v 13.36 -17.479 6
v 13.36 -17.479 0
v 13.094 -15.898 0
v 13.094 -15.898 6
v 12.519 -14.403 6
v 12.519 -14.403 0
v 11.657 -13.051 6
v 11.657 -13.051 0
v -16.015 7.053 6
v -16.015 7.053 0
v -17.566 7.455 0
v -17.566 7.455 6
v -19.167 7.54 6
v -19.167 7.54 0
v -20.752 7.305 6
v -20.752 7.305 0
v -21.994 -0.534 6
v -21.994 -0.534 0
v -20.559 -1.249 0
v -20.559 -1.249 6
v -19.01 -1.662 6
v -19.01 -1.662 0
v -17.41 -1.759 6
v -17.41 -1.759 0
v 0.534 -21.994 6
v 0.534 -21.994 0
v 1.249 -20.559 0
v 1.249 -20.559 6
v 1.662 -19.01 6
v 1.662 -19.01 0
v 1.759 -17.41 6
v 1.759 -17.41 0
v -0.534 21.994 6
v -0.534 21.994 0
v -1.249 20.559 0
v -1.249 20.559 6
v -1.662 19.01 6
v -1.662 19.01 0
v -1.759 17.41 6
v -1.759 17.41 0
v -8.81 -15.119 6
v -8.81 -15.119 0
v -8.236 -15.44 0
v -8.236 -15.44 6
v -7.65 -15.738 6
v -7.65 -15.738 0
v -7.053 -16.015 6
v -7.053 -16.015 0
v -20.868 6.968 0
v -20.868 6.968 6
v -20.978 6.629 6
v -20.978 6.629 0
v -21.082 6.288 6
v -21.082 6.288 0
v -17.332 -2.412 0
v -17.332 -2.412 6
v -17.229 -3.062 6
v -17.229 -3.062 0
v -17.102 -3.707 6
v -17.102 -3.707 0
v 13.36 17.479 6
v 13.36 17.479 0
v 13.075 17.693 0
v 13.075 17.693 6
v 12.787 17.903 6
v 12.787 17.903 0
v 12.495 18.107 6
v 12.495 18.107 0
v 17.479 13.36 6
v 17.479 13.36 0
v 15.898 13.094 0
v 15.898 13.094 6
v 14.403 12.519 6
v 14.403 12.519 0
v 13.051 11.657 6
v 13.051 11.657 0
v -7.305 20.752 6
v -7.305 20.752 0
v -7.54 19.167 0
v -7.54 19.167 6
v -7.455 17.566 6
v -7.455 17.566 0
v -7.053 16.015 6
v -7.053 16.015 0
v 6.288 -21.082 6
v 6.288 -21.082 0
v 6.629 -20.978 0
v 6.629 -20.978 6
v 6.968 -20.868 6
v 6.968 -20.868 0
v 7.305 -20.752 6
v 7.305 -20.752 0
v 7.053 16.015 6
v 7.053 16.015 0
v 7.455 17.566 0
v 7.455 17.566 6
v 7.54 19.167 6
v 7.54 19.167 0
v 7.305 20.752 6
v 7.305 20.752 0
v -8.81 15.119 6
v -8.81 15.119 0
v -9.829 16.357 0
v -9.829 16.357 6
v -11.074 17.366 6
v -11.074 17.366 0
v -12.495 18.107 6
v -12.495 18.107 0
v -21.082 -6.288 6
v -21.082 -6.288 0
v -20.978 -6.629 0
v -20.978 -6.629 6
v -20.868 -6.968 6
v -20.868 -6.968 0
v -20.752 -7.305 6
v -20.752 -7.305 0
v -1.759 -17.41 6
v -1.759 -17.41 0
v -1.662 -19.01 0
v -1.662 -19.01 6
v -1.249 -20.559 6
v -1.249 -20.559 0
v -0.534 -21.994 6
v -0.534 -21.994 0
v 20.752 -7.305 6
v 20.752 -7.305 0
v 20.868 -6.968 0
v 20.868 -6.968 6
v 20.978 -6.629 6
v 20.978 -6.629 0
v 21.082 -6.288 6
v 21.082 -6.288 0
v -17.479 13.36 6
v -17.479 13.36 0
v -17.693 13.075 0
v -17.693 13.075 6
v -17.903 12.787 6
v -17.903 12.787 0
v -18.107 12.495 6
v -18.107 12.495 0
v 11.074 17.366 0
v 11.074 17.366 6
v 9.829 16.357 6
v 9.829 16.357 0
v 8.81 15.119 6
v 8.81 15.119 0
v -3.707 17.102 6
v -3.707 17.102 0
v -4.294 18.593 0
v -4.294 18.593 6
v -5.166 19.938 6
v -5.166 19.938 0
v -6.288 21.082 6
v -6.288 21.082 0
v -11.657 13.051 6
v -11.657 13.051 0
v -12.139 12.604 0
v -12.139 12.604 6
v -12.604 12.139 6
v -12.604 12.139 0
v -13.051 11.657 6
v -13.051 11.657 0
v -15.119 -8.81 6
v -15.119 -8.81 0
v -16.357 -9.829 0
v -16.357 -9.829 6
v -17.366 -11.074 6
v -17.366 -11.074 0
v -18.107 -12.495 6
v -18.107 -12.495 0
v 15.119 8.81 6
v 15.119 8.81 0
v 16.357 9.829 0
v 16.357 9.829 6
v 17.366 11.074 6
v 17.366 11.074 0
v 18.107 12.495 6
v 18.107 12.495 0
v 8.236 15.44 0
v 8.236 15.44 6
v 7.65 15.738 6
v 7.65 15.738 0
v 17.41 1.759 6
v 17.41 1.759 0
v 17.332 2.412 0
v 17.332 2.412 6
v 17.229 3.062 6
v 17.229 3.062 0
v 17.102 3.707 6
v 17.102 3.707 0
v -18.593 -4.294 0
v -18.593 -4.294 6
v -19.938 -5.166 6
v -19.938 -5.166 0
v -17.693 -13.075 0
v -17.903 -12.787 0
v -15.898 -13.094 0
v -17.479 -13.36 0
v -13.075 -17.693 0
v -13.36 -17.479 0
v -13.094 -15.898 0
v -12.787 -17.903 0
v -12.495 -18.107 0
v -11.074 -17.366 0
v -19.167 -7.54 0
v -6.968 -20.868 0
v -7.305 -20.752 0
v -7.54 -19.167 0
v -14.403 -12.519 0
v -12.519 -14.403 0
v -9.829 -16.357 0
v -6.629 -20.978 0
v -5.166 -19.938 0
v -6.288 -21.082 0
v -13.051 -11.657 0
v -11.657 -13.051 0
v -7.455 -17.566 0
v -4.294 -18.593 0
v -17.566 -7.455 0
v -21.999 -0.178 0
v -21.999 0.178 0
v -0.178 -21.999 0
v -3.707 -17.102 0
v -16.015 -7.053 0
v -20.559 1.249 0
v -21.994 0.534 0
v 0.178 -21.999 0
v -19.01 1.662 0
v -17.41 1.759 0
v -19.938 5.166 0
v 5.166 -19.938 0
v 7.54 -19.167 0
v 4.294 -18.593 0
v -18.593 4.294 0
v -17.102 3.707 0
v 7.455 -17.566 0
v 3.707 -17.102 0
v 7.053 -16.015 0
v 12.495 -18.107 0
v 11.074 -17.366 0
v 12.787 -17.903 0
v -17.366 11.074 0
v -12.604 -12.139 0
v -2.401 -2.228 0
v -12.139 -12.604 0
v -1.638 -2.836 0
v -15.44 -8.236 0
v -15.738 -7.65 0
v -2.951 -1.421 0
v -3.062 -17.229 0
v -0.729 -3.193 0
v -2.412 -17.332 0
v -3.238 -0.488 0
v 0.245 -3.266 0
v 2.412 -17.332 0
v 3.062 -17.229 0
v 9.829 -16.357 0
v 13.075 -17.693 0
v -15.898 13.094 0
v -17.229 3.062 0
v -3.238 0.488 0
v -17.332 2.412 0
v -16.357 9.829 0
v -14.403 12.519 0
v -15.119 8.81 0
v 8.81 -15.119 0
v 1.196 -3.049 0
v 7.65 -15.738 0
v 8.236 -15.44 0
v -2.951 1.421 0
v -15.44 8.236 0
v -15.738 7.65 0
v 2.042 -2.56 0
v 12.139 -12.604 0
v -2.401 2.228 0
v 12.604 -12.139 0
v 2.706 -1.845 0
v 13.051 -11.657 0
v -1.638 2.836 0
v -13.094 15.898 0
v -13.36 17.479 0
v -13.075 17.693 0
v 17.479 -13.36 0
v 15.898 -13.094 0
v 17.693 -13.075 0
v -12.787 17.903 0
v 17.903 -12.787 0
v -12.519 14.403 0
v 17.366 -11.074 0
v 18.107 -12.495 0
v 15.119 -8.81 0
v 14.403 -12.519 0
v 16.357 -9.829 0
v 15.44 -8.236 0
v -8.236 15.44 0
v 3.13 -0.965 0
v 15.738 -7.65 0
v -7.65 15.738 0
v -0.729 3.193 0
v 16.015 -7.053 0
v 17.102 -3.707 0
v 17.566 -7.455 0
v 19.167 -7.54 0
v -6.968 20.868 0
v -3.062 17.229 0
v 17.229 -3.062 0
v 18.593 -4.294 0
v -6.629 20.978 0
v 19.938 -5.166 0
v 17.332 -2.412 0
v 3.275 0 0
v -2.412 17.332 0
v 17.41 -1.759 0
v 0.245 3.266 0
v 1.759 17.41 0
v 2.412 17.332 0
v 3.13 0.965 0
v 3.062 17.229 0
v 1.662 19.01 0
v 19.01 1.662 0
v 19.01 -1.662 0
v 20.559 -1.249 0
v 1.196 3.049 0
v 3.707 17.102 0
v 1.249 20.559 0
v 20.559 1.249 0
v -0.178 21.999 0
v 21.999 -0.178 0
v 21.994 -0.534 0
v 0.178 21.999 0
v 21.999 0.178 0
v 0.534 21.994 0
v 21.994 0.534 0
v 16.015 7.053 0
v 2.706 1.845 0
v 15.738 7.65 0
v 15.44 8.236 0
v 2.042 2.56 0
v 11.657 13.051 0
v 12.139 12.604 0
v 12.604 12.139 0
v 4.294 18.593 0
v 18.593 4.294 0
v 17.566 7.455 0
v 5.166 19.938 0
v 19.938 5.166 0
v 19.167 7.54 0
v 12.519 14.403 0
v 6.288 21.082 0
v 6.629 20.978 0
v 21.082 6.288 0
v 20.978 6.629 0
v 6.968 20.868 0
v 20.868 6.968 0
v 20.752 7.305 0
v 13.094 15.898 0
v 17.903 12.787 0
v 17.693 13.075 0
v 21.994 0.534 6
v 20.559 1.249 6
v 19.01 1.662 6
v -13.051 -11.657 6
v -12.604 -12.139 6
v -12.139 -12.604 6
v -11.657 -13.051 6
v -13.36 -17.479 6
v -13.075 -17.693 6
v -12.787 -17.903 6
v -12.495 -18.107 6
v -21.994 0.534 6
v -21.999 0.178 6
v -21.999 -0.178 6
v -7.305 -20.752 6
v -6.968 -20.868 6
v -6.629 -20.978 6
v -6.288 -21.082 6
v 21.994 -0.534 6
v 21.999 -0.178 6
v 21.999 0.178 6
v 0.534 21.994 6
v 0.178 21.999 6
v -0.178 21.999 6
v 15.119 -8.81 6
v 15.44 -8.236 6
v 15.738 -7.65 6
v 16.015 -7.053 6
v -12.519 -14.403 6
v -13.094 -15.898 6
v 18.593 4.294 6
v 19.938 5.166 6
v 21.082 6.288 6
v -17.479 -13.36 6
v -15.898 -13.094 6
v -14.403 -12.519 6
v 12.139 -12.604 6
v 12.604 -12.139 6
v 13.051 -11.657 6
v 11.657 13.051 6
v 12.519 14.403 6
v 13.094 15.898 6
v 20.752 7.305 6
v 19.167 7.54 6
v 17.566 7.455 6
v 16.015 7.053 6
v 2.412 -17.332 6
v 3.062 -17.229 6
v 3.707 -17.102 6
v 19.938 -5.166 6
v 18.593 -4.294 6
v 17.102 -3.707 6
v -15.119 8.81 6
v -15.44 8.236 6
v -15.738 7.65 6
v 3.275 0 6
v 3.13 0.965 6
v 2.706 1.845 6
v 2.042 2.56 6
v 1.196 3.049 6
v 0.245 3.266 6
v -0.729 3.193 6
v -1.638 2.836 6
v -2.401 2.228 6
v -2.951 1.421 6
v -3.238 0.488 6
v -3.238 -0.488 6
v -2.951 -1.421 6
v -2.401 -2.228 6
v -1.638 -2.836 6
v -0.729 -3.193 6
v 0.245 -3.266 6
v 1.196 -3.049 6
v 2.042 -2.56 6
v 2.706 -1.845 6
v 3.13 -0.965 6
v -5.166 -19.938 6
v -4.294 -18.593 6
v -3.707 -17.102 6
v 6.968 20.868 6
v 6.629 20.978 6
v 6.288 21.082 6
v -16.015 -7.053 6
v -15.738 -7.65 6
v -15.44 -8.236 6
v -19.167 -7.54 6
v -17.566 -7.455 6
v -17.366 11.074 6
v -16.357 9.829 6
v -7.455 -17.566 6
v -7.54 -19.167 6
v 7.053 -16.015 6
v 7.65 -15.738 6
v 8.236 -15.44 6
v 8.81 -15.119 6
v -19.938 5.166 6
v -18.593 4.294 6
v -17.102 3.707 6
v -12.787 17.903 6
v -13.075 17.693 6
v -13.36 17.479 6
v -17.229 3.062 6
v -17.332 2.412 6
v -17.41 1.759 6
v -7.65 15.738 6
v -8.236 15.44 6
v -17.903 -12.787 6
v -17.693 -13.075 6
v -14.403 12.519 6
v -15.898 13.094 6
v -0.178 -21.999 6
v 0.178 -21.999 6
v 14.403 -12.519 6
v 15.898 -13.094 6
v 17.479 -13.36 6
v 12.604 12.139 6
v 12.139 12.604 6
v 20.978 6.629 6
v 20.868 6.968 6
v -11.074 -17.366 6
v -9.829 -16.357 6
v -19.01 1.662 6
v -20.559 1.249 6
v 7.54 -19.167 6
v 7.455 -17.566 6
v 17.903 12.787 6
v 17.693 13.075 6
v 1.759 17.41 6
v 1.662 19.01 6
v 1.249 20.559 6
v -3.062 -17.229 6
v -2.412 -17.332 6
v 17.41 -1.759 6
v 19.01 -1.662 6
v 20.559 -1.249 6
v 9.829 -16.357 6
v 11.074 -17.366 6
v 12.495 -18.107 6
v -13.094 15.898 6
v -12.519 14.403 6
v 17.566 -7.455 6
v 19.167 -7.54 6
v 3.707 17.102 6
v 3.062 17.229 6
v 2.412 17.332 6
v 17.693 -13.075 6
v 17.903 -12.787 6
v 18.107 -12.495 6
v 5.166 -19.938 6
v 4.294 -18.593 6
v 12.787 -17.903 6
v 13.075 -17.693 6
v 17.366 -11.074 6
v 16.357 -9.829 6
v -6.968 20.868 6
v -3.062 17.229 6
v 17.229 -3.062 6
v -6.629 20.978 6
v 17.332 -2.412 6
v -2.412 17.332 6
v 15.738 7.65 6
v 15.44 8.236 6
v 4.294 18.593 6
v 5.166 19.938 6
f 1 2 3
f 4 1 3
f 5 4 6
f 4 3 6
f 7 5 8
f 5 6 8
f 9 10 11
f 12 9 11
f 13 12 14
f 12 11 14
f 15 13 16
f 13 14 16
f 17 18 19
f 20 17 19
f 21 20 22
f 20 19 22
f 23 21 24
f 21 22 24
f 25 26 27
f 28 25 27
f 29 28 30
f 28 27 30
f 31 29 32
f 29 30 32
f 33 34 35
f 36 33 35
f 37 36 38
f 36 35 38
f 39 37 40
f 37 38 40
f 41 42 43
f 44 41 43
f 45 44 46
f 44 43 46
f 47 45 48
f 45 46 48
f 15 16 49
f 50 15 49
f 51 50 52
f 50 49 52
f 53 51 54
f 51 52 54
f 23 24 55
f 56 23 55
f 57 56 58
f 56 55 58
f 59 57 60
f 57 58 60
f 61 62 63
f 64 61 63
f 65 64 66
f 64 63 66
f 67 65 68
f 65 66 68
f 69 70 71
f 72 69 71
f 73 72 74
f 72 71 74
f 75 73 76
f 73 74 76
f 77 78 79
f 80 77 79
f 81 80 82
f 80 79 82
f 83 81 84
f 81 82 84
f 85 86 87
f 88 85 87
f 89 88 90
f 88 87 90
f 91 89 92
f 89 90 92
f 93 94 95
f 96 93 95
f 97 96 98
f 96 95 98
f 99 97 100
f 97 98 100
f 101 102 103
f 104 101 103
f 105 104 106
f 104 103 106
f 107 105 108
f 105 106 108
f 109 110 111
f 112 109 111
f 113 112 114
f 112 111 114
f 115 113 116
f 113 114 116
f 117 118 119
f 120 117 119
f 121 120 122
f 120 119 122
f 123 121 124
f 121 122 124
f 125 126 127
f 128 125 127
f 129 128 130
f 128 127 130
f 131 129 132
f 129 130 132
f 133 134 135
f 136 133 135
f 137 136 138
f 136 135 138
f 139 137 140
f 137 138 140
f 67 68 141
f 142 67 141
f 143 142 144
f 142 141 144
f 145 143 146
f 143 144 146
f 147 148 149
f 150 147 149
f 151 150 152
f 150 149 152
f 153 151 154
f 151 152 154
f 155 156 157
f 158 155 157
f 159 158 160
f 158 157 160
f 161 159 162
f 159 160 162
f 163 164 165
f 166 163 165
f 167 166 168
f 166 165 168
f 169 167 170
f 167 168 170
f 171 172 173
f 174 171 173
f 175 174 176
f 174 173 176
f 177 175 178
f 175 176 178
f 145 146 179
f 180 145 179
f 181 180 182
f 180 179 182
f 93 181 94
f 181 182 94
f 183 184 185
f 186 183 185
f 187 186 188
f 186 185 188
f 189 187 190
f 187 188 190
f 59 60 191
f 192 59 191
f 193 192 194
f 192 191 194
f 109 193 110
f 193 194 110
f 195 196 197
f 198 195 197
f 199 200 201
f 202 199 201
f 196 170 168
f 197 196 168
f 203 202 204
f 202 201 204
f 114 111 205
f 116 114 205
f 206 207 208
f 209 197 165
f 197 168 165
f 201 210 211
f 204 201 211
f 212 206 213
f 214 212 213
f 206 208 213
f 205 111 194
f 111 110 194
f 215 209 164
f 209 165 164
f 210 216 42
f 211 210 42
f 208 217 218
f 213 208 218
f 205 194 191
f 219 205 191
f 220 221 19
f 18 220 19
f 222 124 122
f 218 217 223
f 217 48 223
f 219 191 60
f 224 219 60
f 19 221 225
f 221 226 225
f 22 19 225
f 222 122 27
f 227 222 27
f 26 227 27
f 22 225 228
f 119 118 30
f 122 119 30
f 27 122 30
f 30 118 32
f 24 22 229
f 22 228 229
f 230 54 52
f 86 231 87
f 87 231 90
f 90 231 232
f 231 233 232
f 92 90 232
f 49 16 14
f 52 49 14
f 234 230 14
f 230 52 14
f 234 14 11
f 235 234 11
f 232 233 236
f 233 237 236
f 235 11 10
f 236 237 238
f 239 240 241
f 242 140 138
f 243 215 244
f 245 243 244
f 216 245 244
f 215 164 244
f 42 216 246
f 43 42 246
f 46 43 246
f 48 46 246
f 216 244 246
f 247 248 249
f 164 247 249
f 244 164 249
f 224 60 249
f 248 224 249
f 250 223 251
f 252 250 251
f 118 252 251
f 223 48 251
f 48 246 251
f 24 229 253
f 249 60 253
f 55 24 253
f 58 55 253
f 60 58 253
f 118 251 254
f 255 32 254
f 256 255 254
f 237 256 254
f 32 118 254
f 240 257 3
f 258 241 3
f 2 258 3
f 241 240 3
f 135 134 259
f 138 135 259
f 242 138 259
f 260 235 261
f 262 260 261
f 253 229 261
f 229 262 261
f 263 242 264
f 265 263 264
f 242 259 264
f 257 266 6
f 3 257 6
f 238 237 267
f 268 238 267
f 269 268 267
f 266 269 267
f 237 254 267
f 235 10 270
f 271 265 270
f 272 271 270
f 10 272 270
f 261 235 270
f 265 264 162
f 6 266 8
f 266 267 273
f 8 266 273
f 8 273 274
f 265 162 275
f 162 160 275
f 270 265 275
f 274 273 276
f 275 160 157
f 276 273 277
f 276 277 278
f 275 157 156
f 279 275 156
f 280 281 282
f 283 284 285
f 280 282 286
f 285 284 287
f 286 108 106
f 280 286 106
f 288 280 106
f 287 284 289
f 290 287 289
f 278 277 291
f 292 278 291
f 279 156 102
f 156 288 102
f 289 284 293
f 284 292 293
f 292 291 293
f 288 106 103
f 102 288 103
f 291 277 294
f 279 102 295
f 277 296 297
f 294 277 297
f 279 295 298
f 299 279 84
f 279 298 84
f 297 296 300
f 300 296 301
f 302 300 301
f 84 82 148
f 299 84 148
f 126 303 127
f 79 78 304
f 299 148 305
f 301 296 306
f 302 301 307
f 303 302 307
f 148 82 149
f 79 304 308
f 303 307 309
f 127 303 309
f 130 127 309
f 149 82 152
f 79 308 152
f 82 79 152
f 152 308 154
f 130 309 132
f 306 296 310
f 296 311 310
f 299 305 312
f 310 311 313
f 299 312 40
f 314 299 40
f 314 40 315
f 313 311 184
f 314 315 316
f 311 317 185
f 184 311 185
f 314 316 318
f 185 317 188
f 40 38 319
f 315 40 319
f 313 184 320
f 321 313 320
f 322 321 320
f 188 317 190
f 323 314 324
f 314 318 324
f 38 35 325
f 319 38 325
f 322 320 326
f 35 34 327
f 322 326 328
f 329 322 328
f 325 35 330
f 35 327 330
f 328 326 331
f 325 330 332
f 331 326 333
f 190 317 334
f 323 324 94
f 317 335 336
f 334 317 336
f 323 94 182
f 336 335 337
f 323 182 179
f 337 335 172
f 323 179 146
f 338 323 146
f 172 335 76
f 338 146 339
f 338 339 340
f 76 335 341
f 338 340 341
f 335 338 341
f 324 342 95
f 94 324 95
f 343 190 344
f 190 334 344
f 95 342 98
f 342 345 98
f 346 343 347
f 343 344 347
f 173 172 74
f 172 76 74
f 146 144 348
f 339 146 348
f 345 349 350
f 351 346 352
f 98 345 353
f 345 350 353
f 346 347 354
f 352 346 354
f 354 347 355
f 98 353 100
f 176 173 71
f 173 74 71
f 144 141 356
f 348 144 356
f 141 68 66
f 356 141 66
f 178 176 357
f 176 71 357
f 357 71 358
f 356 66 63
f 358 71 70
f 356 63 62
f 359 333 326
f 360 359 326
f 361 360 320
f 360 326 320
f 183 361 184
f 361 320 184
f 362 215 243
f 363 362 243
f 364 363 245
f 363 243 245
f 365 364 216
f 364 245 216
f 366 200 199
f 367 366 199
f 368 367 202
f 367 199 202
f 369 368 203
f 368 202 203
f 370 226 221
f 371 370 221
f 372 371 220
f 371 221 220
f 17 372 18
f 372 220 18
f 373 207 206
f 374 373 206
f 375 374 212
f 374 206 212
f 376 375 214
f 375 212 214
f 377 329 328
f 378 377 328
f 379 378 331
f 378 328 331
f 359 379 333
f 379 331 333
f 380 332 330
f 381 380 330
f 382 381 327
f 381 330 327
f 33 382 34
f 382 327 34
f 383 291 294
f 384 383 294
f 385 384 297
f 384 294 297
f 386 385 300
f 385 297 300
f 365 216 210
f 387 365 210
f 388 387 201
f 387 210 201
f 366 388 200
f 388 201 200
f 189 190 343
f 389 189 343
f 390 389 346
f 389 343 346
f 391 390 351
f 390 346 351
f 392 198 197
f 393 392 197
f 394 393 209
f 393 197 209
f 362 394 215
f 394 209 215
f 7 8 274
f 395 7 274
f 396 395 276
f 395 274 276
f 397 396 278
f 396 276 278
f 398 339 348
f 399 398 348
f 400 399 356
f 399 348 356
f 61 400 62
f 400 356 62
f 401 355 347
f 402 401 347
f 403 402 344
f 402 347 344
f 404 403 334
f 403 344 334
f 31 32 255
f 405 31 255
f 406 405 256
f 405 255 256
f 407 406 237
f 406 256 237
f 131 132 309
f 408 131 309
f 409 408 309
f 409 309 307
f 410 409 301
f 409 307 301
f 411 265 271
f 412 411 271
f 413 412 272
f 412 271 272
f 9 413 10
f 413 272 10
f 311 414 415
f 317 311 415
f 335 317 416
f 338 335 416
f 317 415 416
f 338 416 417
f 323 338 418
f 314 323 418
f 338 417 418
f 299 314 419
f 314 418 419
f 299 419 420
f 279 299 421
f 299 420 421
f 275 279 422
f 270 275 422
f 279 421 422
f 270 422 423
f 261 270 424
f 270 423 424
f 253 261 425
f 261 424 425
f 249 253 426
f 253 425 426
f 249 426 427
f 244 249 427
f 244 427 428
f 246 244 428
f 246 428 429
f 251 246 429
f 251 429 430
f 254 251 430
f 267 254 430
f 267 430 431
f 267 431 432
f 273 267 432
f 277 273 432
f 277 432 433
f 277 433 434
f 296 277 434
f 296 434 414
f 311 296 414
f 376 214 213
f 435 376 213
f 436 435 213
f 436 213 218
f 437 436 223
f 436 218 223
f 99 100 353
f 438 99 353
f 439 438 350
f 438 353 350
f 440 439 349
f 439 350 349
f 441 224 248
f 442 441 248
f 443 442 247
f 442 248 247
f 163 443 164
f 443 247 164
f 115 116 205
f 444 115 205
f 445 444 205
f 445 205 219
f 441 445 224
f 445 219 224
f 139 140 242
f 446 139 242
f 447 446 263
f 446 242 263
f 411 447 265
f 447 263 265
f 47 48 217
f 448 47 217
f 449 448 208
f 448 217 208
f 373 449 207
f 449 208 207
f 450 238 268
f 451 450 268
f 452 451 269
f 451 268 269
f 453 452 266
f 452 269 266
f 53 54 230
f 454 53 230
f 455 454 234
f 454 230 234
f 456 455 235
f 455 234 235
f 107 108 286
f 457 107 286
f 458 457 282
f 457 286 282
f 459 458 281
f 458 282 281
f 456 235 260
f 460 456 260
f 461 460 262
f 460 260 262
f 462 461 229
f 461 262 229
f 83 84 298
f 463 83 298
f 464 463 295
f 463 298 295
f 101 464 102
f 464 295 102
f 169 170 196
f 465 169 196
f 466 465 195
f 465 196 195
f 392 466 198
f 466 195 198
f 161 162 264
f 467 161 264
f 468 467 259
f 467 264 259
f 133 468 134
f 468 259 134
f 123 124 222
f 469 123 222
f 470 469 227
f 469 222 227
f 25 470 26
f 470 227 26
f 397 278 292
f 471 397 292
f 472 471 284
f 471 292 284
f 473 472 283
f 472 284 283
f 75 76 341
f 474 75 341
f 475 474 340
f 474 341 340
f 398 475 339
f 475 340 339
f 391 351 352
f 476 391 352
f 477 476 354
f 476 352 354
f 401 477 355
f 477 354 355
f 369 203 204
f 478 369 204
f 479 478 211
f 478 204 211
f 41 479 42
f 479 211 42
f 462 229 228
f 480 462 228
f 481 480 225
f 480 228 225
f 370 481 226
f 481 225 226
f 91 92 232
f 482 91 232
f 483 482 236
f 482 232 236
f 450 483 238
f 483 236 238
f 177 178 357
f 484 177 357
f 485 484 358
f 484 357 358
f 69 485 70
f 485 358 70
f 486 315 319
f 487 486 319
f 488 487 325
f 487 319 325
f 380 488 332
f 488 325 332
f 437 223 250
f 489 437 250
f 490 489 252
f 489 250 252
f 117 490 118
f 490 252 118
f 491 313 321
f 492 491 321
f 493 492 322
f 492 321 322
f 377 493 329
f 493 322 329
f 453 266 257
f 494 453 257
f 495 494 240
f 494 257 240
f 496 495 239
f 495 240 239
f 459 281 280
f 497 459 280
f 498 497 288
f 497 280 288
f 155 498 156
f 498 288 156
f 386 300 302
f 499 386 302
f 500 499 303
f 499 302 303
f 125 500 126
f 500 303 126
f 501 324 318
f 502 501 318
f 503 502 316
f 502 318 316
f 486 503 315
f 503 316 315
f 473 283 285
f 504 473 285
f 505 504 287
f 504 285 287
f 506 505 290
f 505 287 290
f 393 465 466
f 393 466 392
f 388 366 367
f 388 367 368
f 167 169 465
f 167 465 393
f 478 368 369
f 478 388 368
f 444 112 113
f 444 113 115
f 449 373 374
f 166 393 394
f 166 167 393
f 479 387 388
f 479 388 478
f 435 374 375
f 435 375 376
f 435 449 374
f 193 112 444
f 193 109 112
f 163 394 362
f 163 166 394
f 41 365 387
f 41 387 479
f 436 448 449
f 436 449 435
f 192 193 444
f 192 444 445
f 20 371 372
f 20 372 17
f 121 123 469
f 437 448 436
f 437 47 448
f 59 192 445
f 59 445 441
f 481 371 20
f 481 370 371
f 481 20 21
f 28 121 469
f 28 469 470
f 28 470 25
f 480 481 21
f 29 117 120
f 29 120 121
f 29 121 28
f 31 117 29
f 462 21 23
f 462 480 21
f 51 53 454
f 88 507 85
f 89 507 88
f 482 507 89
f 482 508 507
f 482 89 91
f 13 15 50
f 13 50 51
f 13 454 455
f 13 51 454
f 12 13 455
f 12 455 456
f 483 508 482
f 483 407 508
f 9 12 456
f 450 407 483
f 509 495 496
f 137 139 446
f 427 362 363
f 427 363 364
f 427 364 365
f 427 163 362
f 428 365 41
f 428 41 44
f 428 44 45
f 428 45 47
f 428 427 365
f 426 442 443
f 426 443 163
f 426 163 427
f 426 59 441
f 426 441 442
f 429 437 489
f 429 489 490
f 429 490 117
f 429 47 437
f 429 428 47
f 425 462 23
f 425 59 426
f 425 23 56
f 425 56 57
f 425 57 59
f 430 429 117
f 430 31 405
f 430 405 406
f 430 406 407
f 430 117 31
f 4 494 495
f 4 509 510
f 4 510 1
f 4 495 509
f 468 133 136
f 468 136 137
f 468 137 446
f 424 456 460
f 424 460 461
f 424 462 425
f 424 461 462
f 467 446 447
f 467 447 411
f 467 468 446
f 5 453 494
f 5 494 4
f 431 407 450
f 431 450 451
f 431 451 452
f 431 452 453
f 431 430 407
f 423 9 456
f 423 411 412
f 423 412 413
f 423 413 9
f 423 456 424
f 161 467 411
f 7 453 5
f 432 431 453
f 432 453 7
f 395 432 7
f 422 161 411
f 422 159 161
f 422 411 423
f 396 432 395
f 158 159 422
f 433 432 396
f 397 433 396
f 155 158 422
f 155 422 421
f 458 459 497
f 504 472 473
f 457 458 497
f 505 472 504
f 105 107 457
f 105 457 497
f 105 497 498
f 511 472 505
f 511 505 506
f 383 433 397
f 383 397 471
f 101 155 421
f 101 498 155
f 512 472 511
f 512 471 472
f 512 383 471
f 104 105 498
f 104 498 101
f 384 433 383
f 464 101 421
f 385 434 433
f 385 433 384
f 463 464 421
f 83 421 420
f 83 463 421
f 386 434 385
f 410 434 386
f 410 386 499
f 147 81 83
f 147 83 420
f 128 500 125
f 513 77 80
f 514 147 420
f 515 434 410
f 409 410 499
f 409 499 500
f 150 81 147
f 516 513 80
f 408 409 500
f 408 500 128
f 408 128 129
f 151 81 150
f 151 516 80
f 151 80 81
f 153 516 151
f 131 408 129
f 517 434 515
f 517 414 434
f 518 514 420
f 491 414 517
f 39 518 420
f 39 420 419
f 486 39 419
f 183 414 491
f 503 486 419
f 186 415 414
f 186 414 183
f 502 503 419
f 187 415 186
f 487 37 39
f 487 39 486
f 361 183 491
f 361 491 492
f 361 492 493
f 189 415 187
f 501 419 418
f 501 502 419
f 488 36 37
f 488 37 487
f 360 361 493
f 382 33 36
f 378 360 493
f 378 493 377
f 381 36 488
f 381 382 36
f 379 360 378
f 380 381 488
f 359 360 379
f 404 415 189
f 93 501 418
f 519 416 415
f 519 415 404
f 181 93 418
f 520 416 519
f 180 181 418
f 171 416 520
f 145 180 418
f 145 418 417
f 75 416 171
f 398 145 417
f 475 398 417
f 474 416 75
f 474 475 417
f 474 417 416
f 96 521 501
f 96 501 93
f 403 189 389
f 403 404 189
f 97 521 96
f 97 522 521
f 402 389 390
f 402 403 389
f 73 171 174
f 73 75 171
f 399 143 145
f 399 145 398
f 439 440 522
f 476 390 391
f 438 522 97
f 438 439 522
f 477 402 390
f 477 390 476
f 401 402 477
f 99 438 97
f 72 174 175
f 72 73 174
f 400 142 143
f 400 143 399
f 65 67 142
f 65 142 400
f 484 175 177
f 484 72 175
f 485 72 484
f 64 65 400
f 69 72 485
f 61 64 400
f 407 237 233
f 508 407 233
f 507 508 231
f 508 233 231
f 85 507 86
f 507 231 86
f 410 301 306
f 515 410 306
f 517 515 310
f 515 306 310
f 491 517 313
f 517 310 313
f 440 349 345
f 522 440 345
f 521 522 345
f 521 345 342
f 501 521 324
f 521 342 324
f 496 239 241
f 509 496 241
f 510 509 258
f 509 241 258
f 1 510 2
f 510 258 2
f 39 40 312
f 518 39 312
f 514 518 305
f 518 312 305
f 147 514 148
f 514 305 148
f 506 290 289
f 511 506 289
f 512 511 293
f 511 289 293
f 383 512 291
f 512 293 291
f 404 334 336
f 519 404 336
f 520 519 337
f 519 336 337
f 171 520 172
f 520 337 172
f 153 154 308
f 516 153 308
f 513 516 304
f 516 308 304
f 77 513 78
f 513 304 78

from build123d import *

# Parameters (mm, degrees)
SKETCH1_R           = 2
BOSS_EXTRUDE1_DEPTH = 6
SKETCH2_R           = 5.139196493
BOSS_EXTRUDE2_DEPTH = 6
SKETCH3_R           = 3.275
CUT_EXTRUDE1_DEPTH  = 10


with BuildPart() as part:
    # Sketch1 → Boss-Extrude1 (new body)
    with BuildSketch(Plane.XY):
        with BuildLine():
            ThreePointArc((12.495099897, 18.107249337), (10.42619144, 16.892644253), (8.810439427, 15.119231399))
            ThreePointArc((8.810439427, 15.119231399), (7.944379755, 15.591723167), (7.053068783, 16.014656467))
            ThreePointArc((7.053068783, 16.014656467), (7.538074714, 18.364213225), (7.304636989, 20.751922283))
            ThreePointArc((7.304636989, 20.751922283), (6.798373876, 20.923243358), (6.288098413, 21.082215689))
            ThreePointArc((6.288098413, 21.082215689), (4.695783155, 19.287729735), (3.707126384, 17.101819055))
            ThreePointArc((3.707126384, 17.101819055), (2.737446704, 17.283558272), (1.759066019, 17.410361505))
            ThreePointArc((1.759066019, 17.410361505), (1.494281102, 19.794797846), (0.534425957, 21.993507881))
            ThreePointArc((0.534425957, 21.993507881), (0, 22), (-0.534425957, 21.993507881))
            ThreePointArc((-0.534425957, 21.993507881), (-1.494281102, 19.794797846), (-1.759066019, 17.410361506))
            ThreePointArc((-1.759066019, 17.410361506), (-2.737446704, 17.283558272), (-3.707126384, 17.101819055))
            ThreePointArc((-3.707126384, 17.101819055), (-4.695783155, 19.287729736), (-6.288098413, 21.082215689))
            ThreePointArc((-6.288098413, 21.082215689), (-6.798373876, 20.923243359), (-7.30463699, 20.751922284))
            ThreePointArc((-7.30463699, 20.751922284), (-7.538074714, 18.364213226), (-7.053068783, 16.014656467))
            ThreePointArc((-7.053068783, 16.014656467), (-7.944379755, 15.591723167), (-8.810439427, 15.1192314))
            ThreePointArc((-8.810439427, 15.1192314), (-10.42619144, 16.892644253), (-12.495099898, 18.107249337))
            ThreePointArc((-12.495099898, 18.107249337), (-12.931275551, 17.798373876), (-13.35981926, 17.478993946))
            ThreePointArc((-13.35981926, 17.478993946), (-12.843989052, 15.136011463), (-11.656668033, 13.051325273))
            ThreePointArc((-11.656668033, 13.051325273), (-12.373661564, 12.373661564), (-13.051325273, 11.656668033))
            ThreePointArc((-13.051325273, 11.656668033), (-15.136011463, 12.843989052), (-17.478993946, 13.35981926))
            ThreePointArc((-17.478993946, 13.35981926), (-17.798373876, 12.931275551), (-18.107249337, 12.495099897))
            ThreePointArc((-18.107249337, 12.495099897), (-16.892644253, 10.42619144), (-15.1192314, 8.810439427))
            ThreePointArc((-15.1192314, 8.810439427), (-15.591723167, 7.944379755), (-16.014656467, 7.053068783))
            ThreePointArc((-16.014656467, 7.053068783), (-18.364213226, 7.538074714), (-20.751922283, 7.30463699))
            ThreePointArc((-20.751922283, 7.30463699), (-20.923243359, 6.798373876), (-21.082215689, 6.288098413))
            ThreePointArc((-21.082215689, 6.288098413), (-19.287729736, 4.695783155), (-17.101819055, 3.707126384))
            ThreePointArc((-17.101819055, 3.707126384), (-17.283558272, 2.737446704), (-17.410361505, 1.759066019))
            ThreePointArc((-17.410361505, 1.759066019), (-19.794797846, 1.494281102), (-21.993507881, 0.534425956))
            ThreePointArc((-21.993507881, 0.534425956), (-22, 0), (-21.993507881, -0.534425957))
            ThreePointArc((-21.993507881, -0.534425957), (-19.794797846, -1.494281102), (-17.410361505, -1.759066019))
            ThreePointArc((-17.410361505, -1.759066019), (-17.283558272, -2.737446704), (-17.101819055, -3.707126384))
            ThreePointArc((-17.101819055, -3.707126384), (-19.287729736, -4.695783155), (-21.082215689, -6.288098413))
            ThreePointArc((-21.082215689, -6.288098413), (-20.923243359, -6.798373876), (-20.751922283, -7.30463699))
            ThreePointArc((-20.751922283, -7.30463699), (-18.364213225, -7.538074714), (-16.014656467, -7.053068783))
            ThreePointArc((-16.014656467, -7.053068783), (-15.591723167, -7.944379755), (-15.1192314, -8.810439427))
            ThreePointArc((-15.1192314, -8.810439427), (-16.892644253, -10.42619144), (-18.107249337, -12.495099897))
            ThreePointArc((-18.107249337, -12.495099897), (-17.798373876, -12.93127555), (-17.478993946, -13.35981926))
            ThreePointArc((-17.478993946, -13.35981926), (-15.136011463, -12.843989052), (-13.051325272, -11.656668033))
            ThreePointArc((-13.051325272, -11.656668033), (-12.373661564, -12.373661564), (-11.656668033, -13.051325272))
            ThreePointArc((-11.656668033, -13.051325272), (-12.843989052, -15.136011463), (-13.35981926, -17.478993946))
            ThreePointArc((-13.35981926, -17.478993946), (-12.93127555, -17.798373876), (-12.495099897, -18.107249337))
            ThreePointArc((-12.495099897, -18.107249337), (-10.42619144, -16.892644253), (-8.810439427, -15.119231399))
            ThreePointArc((-8.810439427, -15.119231399), (-7.944379755, -15.591723167), (-7.053068783, -16.014656467))
            ThreePointArc((-7.053068783, -16.014656467), (-7.538074714, -18.364213225), (-7.304636989, -20.751922283))
            ThreePointArc((-7.304636989, -20.751922283), (-6.798373876, -20.923243358), (-6.288098413, -21.082215689))
            ThreePointArc((-6.288098413, -21.082215689), (-4.695783155, -19.287729735), (-3.707126384, -17.101819055))
            ThreePointArc((-3.707126384, -17.101819055), (-2.737446704, -17.283558272), (-1.759066019, -17.410361505))
            ThreePointArc((-1.759066019, -17.410361505), (-1.494281102, -19.794797846), (-0.534425956, -21.993507881))
            ThreePointArc((-0.534425956, -21.993507881), (0, -22), (0.534425957, -21.993507881))
            ThreePointArc((0.534425957, -21.993507881), (1.494281102, -19.794797846), (1.759066019, -17.410361505))
            ThreePointArc((1.759066019, -17.410361505), (2.737446704, -17.283558272), (3.707126384, -17.101819055))
            ThreePointArc((3.707126384, -17.101819055), (4.695783155, -19.287729735), (6.288098413, -21.082215689))
            ThreePointArc((6.288098413, -21.082215689), (6.798373876, -20.923243358), (7.304636989, -20.751922283))
            ThreePointArc((7.304636989, -20.751922283), (7.538074714, -18.364213225), (7.053068783, -16.014656467))
            ThreePointArc((7.053068783, -16.014656467), (7.944379755, -15.591723167), (8.810439427, -15.119231399))
            ThreePointArc((8.810439427, -15.119231399), (10.42619144, -16.892644253), (12.495099897, -18.107249337))
            ThreePointArc((12.495099897, -18.107249337), (12.93127555, -17.798373876), (13.359819259, -17.478993946))
            ThreePointArc((13.359819259, -17.478993946), (12.843989052, -15.136011463), (11.656668033, -13.051325272))
            ThreePointArc((11.656668033, -13.051325272), (12.373661564, -12.373661564), (13.051325272, -11.656668033))
            ThreePointArc((13.051325272, -11.656668033), (15.136011463, -12.843989052), (17.478993946, -13.35981926))
            ThreePointArc((17.478993946, -13.35981926), (17.798373876, -12.93127555), (18.107249337, -12.495099897))
            ThreePointArc((18.107249337, -12.495099897), (16.892644253, -10.42619144), (15.119231399, -8.810439427))
            ThreePointArc((15.119231399, -8.810439427), (15.591723167, -7.944379755), (16.014656467, -7.053068783))
            ThreePointArc((16.014656467, -7.053068783), (18.364213225, -7.538074714), (20.751922283, -7.304636989))
            ThreePointArc((20.751922283, -7.304636989), (20.923243358, -6.798373876), (21.082215689, -6.288098413))
            ThreePointArc((21.082215689, -6.288098413), (19.287729735, -4.695783155), (17.101819055, -3.707126384))
            ThreePointArc((17.101819055, -3.707126384), (17.283558272, -2.737446704), (17.410361505, -1.759066019))
            ThreePointArc((17.410361505, -1.759066019), (19.794797846, -1.494281102), (21.993507881, -0.534425956))
            ThreePointArc((21.993507881, -0.534425956), (22, 0), (21.993507881, 0.534425957))
            ThreePointArc((21.993507881, 0.534425957), (19.794797846, 1.494281102), (17.410361505, 1.759066019))
            ThreePointArc((17.410361505, 1.759066019), (17.283558272, 2.737446704), (17.101819055, 3.707126384))
            ThreePointArc((17.101819055, 3.707126384), (19.287729735, 4.695783155), (21.082215689, 6.288098413))
            ThreePointArc((21.082215689, 6.288098413), (20.923243358, 6.798373876), (20.751922283, 7.304636989))
            ThreePointArc((20.751922283, 7.304636989), (18.364213225, 7.538074714), (16.014656467, 7.053068783))
            ThreePointArc((16.014656467, 7.053068783), (15.591723167, 7.944379755), (15.119231399, 8.810439427))
            ThreePointArc((15.119231399, 8.810439427), (16.892644253, 10.42619144), (18.107249337, 12.495099897))
            ThreePointArc((18.107249337, 12.495099897), (17.798373876, 12.93127555), (17.478993946, 13.359819259))
            ThreePointArc((17.478993946, 13.359819259), (15.136011463, 12.843989052), (13.051325272, 11.656668033))
            ThreePointArc((13.051325272, 11.656668033), (12.373661564, 12.373661564), (11.656668033, 13.051325272))
            ThreePointArc((11.656668033, 13.051325272), (12.843989052, 15.136011463), (13.35981926, 17.478993946))
            ThreePointArc((13.35981926, 17.478993946), (12.93127555, 17.798373876), (12.495099897, 18.107249337))
        make_face()
        Circle(SKETCH1_R, mode=Mode.SUBTRACT)
    extrude(amount=BOSS_EXTRUDE1_DEPTH)

    # Sketch2 → Boss-Extrude2 (add)
    with BuildSketch(Plane.XY.offset(6)):
        Circle(SKETCH2_R)
    extrude(amount=-BOSS_EXTRUDE2_DEPTH)

    # Sketch3 → Cut-Extrude1 (cut)
    with BuildSketch(Plane.XY.offset(6)):
        Circle(SKETCH3_R)
    extrude(amount=-CUT_EXTRUDE1_DEPTH, mode=Mode.SUBTRACT)


solid = part.part
